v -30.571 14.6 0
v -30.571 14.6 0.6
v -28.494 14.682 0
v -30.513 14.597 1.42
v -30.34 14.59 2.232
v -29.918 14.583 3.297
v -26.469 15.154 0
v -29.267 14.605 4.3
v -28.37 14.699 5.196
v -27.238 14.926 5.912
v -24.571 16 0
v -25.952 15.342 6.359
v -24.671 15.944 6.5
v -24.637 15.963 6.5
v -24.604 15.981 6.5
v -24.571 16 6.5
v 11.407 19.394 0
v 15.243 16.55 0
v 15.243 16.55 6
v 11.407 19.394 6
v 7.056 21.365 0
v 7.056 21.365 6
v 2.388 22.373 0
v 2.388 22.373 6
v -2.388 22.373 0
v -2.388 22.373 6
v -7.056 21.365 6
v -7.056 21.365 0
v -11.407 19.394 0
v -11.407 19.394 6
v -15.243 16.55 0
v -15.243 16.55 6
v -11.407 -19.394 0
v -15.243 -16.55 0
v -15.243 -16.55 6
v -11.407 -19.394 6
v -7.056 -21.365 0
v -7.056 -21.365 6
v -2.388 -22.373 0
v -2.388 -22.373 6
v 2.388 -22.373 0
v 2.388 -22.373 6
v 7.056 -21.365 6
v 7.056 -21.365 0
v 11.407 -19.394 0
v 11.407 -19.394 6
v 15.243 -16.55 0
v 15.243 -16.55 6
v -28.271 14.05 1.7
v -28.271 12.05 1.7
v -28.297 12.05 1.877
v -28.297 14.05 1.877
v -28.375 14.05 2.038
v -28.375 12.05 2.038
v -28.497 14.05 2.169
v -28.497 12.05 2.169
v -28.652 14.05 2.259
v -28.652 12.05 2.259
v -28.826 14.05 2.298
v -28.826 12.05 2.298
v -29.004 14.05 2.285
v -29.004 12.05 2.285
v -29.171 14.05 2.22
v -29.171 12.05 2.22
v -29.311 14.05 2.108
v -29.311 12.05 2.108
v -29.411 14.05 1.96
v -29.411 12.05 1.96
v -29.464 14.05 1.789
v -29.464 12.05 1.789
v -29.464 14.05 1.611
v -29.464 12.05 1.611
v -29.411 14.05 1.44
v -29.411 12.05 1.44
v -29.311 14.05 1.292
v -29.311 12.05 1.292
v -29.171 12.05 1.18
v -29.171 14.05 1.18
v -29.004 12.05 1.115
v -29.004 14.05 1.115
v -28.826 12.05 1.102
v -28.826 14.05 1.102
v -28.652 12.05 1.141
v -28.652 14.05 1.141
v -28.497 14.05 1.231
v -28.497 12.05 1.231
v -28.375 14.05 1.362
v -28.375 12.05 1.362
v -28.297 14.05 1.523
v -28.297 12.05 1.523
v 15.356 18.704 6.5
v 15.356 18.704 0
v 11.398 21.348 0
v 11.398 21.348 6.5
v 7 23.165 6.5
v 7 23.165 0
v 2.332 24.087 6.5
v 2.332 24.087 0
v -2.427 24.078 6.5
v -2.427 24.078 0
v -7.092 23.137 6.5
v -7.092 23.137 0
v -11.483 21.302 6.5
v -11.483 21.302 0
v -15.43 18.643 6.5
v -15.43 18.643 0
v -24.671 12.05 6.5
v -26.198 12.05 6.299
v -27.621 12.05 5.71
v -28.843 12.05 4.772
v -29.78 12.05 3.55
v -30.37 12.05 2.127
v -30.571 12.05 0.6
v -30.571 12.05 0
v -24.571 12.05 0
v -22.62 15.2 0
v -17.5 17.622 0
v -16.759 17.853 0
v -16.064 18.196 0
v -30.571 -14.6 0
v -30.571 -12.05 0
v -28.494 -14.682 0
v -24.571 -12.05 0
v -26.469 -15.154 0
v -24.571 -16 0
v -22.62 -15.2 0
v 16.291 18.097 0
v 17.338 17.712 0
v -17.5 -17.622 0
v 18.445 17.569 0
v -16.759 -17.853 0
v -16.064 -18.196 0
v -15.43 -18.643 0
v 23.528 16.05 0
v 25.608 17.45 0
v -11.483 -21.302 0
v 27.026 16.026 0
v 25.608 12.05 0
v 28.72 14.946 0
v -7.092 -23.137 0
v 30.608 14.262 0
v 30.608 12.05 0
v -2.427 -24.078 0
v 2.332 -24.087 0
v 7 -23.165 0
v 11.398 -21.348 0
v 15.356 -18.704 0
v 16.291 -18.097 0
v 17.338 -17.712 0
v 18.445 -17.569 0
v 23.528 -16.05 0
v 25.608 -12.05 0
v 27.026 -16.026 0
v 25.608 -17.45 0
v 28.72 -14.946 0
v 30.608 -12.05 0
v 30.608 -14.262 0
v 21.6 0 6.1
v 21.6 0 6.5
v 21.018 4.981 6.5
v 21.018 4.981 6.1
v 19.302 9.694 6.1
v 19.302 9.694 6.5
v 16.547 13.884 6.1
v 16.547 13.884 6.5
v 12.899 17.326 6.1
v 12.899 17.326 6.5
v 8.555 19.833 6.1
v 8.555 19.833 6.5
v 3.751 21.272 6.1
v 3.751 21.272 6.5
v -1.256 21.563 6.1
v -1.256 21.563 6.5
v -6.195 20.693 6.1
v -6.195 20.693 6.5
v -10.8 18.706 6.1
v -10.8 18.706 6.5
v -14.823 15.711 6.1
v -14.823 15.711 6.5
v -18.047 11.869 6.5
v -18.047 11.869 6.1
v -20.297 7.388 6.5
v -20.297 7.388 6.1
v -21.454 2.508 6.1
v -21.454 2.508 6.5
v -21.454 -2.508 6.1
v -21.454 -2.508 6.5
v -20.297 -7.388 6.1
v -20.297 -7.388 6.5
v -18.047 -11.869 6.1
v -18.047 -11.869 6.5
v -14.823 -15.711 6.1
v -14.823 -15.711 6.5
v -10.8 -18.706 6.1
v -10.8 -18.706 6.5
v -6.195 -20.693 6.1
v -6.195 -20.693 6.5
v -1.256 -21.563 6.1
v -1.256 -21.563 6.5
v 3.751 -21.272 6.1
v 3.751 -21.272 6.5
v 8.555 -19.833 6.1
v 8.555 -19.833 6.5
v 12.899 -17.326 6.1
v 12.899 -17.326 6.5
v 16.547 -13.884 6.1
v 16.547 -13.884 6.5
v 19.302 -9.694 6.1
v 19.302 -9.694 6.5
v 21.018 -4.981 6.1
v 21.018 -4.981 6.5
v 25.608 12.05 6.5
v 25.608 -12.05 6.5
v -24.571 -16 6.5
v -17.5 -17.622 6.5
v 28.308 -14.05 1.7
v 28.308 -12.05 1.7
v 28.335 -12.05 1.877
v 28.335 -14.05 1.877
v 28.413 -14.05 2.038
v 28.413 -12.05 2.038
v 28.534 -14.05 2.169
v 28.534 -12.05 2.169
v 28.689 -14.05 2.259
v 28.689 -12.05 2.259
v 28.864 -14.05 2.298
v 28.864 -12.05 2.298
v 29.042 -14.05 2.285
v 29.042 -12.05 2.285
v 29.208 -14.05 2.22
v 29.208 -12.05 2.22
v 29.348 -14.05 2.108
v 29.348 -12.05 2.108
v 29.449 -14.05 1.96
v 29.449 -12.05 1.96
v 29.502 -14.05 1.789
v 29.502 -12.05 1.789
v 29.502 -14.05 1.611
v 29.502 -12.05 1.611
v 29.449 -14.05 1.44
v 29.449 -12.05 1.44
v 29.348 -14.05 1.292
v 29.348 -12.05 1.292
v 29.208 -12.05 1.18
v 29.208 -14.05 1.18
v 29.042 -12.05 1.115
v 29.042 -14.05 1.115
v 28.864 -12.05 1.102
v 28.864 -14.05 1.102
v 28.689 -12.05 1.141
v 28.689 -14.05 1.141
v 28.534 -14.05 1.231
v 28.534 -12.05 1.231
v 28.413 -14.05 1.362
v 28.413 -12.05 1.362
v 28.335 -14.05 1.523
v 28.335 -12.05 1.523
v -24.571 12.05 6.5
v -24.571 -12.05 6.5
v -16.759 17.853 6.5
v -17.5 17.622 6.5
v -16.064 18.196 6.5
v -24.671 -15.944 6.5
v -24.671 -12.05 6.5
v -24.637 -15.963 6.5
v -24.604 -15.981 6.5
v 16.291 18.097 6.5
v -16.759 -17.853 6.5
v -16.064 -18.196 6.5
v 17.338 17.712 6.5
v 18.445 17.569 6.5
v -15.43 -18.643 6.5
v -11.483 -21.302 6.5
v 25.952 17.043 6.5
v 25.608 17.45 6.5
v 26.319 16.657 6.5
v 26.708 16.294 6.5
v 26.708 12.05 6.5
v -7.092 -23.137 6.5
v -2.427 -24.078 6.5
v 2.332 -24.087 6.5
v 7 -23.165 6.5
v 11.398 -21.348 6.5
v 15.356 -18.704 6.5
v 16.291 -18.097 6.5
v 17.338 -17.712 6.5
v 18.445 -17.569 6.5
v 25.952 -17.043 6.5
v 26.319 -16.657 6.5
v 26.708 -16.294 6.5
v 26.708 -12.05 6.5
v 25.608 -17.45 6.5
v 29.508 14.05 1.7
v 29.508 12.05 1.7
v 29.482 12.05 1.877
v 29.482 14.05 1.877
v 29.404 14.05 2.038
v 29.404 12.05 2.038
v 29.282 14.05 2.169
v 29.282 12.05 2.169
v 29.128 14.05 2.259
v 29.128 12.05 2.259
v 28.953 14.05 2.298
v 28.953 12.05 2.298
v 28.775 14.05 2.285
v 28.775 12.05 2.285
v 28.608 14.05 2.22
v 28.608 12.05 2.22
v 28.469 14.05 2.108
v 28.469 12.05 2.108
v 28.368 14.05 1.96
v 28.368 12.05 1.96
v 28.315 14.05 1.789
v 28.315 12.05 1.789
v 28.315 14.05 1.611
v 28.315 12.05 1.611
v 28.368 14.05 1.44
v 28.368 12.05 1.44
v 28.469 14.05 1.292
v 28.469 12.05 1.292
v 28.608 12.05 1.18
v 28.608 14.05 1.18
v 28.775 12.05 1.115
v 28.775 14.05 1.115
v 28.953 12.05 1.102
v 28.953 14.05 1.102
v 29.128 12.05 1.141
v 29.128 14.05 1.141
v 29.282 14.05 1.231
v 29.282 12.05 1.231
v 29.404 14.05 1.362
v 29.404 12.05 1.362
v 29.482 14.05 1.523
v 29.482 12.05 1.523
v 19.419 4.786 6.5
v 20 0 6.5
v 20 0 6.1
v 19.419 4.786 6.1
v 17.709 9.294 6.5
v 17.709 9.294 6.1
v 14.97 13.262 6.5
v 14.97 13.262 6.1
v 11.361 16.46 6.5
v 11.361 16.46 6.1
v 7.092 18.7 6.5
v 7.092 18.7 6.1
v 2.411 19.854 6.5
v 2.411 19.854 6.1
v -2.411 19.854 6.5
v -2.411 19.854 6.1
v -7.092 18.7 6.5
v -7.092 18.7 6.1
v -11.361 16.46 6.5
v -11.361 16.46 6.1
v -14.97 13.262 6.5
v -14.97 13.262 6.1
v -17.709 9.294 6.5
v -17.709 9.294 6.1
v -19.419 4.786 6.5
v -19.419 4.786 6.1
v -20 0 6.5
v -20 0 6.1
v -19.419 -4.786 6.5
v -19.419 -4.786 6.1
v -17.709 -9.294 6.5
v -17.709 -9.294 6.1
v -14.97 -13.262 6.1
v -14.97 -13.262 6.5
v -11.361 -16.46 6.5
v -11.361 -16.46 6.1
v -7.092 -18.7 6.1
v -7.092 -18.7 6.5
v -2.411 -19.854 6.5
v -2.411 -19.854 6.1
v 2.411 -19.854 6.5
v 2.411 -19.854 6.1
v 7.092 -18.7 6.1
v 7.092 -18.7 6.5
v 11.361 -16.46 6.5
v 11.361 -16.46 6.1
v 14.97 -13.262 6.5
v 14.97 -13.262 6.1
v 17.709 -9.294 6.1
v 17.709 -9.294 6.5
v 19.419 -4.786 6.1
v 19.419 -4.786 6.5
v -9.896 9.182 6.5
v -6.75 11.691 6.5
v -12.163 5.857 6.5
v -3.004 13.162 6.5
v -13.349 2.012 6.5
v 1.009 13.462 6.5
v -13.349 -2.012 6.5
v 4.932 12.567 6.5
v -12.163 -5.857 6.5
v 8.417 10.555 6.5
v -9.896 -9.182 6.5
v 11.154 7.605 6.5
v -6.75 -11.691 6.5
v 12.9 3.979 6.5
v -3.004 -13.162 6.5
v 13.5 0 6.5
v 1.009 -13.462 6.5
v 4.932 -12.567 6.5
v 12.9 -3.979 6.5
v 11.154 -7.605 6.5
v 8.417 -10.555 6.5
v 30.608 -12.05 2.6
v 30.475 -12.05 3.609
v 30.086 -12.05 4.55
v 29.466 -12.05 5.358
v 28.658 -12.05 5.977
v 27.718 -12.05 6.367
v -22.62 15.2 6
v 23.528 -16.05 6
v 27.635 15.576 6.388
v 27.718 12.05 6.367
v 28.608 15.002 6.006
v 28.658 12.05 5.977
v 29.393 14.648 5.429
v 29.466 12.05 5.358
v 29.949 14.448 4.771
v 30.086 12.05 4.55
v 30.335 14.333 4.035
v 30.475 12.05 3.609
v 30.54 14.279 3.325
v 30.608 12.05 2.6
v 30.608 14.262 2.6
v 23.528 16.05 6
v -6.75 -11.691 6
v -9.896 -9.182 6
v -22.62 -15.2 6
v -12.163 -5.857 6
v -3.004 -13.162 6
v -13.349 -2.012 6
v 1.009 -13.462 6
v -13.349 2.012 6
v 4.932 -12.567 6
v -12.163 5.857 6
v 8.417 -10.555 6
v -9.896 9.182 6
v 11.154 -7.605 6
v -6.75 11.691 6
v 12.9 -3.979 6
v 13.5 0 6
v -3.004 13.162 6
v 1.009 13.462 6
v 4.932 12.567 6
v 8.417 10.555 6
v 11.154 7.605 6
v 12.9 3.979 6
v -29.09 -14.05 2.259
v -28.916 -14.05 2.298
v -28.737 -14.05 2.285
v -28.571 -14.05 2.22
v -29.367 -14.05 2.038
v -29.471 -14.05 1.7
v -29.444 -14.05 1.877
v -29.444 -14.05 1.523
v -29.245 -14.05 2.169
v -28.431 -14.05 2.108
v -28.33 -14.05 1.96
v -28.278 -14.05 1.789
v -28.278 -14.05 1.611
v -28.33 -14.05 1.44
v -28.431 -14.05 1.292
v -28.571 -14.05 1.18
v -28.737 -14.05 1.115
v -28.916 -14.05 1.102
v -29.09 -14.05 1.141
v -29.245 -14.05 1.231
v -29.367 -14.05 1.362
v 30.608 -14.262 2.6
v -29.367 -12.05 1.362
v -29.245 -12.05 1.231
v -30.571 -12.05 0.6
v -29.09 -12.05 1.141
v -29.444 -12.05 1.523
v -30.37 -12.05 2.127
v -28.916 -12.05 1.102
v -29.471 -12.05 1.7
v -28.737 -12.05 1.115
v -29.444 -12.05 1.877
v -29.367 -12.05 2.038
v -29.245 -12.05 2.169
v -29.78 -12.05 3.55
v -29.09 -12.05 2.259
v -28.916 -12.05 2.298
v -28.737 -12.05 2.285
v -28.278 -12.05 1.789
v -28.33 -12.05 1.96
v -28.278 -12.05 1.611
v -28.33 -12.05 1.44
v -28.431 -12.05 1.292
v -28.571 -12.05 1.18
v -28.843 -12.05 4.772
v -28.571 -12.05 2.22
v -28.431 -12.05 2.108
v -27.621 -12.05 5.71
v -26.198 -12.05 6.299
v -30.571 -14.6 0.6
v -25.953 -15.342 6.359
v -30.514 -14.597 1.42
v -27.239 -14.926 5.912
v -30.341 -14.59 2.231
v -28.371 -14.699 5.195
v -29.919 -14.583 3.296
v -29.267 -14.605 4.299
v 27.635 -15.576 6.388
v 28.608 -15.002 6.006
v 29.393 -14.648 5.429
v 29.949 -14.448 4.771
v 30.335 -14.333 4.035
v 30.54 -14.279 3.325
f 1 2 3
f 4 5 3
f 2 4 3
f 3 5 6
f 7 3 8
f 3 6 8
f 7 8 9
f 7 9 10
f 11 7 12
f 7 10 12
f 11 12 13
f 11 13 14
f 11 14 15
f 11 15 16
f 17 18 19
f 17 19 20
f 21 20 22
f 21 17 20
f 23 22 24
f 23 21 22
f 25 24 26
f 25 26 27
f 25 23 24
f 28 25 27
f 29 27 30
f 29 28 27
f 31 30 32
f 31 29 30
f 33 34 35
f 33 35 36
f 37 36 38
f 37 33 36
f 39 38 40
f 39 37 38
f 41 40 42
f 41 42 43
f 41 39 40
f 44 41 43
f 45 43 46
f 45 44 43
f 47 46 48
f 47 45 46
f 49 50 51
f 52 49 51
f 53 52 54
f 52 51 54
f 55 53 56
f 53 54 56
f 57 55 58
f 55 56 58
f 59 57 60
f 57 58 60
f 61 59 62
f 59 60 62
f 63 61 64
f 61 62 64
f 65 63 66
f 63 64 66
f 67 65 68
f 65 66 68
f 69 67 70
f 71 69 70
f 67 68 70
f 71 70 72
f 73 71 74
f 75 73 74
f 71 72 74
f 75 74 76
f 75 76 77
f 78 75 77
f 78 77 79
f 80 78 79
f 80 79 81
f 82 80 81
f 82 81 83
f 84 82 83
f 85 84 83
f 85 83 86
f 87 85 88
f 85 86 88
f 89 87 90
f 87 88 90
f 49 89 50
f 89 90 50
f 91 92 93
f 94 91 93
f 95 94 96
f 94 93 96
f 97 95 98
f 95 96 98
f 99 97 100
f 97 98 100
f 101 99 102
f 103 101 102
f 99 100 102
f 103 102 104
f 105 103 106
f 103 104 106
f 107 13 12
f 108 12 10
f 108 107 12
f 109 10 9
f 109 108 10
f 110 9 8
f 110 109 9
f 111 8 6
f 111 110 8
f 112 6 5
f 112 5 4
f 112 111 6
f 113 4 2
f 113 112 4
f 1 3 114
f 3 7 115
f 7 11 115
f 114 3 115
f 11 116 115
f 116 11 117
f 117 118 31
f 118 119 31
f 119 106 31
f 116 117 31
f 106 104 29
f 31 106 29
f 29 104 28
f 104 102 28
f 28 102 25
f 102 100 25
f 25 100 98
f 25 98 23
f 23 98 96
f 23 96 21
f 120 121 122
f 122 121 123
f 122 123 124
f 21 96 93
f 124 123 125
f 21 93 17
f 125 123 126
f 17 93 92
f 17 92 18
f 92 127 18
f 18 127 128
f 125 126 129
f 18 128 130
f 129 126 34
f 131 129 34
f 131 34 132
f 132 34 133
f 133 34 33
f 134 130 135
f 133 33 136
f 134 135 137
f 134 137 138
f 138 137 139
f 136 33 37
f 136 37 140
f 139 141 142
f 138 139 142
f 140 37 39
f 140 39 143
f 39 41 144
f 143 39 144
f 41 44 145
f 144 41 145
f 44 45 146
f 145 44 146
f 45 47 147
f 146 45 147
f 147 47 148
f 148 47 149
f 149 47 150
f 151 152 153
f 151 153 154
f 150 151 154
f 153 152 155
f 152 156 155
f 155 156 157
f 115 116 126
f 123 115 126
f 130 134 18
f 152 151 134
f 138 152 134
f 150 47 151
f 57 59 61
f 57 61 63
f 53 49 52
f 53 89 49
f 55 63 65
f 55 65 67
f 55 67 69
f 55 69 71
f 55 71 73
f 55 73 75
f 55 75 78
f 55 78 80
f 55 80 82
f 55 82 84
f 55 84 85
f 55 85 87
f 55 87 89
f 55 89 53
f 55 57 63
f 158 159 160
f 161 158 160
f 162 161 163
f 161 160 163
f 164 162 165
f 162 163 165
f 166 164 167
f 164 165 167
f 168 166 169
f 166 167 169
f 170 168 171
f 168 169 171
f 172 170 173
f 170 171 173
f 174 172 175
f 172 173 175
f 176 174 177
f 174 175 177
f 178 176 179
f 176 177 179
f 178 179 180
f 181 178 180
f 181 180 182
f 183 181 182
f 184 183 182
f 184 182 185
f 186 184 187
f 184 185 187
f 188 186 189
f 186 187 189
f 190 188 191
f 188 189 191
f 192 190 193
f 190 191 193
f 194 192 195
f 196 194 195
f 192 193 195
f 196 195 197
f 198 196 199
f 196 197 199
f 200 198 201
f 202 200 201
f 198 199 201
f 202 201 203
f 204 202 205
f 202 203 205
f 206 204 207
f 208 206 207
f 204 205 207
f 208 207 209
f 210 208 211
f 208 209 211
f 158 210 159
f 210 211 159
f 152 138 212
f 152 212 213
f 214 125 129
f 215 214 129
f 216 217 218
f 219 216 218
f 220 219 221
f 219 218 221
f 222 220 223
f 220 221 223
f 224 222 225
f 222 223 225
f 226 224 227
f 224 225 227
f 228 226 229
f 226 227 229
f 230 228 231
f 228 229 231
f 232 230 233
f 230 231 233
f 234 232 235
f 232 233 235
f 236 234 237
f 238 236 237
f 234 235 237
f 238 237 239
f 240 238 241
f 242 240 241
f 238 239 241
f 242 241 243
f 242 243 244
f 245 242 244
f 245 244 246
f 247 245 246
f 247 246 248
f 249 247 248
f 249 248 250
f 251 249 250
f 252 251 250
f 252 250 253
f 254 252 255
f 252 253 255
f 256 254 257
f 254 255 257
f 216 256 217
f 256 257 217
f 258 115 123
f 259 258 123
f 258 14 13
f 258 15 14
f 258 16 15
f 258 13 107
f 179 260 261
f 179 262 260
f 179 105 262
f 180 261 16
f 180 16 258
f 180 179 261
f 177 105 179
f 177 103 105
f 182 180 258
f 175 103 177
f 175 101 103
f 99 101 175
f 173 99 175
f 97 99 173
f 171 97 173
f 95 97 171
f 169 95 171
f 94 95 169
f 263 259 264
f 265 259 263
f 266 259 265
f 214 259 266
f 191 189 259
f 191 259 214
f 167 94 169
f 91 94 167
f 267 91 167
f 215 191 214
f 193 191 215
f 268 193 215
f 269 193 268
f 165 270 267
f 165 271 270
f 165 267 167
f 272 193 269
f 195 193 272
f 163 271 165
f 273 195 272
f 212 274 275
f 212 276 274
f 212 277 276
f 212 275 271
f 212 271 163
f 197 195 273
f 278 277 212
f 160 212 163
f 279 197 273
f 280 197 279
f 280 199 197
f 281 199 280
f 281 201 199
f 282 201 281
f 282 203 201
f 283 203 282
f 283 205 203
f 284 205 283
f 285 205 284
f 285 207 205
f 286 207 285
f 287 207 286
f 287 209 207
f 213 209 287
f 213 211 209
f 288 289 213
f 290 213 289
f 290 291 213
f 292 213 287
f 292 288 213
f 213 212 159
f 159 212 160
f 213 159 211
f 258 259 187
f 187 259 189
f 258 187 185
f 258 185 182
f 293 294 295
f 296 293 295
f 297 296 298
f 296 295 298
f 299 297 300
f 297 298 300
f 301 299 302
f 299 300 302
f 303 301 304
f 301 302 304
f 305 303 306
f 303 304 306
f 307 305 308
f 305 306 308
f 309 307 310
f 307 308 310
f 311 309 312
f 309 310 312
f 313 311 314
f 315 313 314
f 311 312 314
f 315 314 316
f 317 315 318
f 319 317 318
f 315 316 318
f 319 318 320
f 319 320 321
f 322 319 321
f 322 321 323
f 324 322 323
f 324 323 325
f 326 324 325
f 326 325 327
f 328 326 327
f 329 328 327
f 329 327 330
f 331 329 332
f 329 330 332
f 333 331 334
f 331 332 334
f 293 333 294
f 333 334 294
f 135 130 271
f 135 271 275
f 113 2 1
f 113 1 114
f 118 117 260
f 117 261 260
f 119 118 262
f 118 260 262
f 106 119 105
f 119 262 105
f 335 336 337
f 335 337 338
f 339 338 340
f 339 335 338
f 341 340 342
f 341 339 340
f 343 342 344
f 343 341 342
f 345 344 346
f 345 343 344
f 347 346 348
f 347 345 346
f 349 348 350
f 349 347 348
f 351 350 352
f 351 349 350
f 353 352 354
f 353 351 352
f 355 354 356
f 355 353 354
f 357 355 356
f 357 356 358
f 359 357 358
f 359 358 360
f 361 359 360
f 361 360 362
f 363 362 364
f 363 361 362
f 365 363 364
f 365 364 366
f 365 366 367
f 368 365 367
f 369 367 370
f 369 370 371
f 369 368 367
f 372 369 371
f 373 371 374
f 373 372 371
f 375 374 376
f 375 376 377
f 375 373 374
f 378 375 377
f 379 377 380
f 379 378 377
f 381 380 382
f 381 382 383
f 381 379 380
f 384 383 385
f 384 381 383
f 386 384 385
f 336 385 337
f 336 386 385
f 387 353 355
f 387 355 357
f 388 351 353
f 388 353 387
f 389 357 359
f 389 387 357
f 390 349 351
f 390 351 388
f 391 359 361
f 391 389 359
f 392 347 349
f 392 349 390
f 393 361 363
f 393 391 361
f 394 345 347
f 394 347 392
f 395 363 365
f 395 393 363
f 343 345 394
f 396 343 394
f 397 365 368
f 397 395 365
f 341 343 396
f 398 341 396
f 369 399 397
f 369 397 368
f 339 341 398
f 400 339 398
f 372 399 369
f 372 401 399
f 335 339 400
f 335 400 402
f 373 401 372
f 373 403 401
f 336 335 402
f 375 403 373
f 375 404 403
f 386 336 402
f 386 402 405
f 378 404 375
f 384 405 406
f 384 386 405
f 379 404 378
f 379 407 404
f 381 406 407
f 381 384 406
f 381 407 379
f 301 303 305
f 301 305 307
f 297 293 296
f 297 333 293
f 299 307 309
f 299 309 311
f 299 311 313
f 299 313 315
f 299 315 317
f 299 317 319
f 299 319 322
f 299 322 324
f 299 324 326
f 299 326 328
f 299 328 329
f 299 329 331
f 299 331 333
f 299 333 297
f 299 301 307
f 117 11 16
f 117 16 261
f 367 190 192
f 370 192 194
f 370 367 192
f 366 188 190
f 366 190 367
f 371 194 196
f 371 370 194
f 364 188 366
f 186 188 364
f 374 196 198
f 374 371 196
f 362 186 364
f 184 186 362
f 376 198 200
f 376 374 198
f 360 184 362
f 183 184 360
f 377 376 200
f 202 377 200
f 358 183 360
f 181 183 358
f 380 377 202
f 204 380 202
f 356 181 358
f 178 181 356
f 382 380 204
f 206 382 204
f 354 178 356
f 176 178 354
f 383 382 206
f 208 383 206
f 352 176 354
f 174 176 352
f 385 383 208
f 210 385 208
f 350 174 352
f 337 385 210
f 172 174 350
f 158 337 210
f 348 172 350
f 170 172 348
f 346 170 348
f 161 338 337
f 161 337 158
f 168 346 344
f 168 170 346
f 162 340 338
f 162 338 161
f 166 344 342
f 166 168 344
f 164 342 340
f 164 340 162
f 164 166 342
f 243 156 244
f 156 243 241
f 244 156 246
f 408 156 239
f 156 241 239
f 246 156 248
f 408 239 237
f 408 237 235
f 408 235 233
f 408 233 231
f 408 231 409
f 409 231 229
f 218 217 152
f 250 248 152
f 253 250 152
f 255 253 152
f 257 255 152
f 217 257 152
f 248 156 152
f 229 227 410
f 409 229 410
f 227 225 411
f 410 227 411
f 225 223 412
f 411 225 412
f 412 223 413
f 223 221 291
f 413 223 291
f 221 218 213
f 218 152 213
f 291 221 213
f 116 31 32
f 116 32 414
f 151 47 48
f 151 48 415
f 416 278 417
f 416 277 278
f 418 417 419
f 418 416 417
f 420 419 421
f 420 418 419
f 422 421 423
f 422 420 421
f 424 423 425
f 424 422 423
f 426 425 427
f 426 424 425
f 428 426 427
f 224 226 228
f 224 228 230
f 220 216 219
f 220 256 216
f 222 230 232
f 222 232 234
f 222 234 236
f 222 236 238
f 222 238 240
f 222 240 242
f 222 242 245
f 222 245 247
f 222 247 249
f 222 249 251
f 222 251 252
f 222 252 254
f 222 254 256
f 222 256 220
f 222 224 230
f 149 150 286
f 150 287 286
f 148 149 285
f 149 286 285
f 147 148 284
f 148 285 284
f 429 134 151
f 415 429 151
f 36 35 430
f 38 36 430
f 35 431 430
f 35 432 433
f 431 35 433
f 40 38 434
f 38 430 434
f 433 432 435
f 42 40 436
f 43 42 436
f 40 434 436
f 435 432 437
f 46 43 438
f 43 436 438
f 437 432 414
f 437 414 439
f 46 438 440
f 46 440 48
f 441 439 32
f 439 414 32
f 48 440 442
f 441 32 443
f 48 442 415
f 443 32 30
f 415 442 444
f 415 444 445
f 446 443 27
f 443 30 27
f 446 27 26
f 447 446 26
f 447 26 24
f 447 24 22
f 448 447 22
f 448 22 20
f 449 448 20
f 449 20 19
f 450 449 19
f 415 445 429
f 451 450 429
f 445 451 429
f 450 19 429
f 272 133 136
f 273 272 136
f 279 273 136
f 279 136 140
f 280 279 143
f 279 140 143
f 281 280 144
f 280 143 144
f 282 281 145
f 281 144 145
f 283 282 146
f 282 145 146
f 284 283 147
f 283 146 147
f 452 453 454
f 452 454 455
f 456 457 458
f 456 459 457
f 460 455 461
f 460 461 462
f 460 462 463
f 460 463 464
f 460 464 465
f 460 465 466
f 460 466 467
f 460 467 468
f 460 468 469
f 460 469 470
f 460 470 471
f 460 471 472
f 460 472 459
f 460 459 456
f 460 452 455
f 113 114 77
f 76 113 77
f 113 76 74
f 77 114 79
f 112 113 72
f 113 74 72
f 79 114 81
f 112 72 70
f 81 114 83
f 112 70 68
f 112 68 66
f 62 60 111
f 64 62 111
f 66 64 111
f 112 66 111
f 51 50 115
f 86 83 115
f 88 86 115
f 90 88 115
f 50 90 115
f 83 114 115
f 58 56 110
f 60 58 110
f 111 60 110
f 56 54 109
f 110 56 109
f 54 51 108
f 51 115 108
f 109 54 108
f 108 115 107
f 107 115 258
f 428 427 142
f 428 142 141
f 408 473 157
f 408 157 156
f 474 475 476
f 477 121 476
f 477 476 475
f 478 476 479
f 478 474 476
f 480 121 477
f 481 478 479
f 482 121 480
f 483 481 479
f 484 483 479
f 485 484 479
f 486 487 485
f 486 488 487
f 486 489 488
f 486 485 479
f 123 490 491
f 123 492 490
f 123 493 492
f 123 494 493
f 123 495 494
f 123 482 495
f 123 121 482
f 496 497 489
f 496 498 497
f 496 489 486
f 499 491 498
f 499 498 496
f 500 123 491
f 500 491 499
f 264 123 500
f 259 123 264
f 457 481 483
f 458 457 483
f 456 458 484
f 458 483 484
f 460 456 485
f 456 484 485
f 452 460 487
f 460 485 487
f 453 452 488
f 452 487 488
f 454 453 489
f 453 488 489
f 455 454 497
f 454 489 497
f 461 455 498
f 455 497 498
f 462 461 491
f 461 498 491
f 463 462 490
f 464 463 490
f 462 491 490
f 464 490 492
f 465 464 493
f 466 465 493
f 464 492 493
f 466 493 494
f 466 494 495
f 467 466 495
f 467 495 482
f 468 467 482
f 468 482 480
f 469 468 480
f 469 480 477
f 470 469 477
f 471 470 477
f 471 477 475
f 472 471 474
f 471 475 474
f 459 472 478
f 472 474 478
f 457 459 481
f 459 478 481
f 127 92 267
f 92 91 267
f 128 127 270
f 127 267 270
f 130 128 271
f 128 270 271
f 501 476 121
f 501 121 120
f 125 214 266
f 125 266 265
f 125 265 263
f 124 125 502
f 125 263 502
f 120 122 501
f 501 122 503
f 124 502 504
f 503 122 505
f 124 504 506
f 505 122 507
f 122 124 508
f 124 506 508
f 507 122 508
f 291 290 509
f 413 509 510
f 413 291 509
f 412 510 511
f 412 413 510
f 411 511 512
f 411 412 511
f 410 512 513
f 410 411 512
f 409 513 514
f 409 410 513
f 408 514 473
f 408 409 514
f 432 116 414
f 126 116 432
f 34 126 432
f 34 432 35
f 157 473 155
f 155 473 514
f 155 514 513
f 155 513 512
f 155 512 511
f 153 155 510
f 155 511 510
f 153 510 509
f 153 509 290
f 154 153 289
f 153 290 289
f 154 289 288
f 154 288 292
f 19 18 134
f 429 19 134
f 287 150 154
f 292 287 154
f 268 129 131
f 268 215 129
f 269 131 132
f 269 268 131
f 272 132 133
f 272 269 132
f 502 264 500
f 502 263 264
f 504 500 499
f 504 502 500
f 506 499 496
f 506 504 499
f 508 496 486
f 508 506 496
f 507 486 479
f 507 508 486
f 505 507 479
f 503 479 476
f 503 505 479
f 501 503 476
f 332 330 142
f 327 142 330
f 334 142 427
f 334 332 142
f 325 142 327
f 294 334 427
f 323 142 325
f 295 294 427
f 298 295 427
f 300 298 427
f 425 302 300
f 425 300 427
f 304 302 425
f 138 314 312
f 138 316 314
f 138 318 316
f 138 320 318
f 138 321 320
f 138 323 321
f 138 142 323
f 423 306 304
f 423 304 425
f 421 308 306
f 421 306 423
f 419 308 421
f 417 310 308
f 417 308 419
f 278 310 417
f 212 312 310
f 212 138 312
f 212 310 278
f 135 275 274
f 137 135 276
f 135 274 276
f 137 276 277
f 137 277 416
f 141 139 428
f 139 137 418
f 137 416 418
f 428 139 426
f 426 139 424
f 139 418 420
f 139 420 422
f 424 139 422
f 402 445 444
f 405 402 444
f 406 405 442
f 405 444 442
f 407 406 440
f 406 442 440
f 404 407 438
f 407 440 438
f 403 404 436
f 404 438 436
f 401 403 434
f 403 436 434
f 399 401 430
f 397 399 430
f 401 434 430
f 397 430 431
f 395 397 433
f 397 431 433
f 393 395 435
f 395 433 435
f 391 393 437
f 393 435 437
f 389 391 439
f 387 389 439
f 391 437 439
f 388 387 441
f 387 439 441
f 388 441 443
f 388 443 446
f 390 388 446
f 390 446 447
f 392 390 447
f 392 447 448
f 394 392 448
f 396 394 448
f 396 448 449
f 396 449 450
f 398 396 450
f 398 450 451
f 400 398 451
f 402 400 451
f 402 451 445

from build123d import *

# Parameters (mm, degrees)
PAD_DEPTH       = 6.5
POCKET_DEPTH    = 6
SKETCH002_R     = 13.5
POCKET001_DEPTH = 1
SKETCH003_W     = 5.4
SKETCH003_H     = 6.5
PAD001_DEPTH    = 5
POCKET002_DEPTH = 10
SKETCH008_R     = 0.6
POCKET003_DEPTH = 2
SKETCH009_R     = 0.6
POCKET004_DEPTH = 2
FILLET_R        = 3.9
FILLET001_R     = 3.9
FILLET002_R     = 5
FILLET003_R     = 5
FILLET004_R     = 5
FILLET005_R     = 5
SKETCH010_W     = 3.95
SKETCH010_H     = 6.5
PAD002_DEPTH    = 6
POCKET005_DEPTH = 10
SKETCH012_R     = 0.6
POCKET006_DEPTH = 2
SKETCH013_R     = 0.6
POCKET007_DEPTH = 2
FILLET006_R     = 5.9
FILLET007_R     = 5.9
SKETCH014_R     = 21.6
SKETCH014_R_2   = 20
POCKET008_DEPTH = 0.4


with BuildPart() as part:
    # Sketch → Pad (new body)
    with BuildSketch(Plane.XY):
        with BuildLine():
            Line((-24.57081, 16), (-24.57081, -16))
            Line((-24.57081, -16), (-16.285883, -17.9))
            ThreePointArc((-16.285883, -17.9), (0.22069, -24.198994), (16.609636, -17.6))
            Line((16.609636, -17.6), (25.608386, -17.45))
            Line((25.608386, 17.45), (25.608386, -17.45))
            Line((16.609636, 17.6), (25.608386, 17.45))
            ThreePointArc((16.609636, 17.6), (0.22069, 24.198994), (-16.285883, 17.9))
            Line((-24.57081, 16), (-16.285883, 17.9))
        make_face()
    extrude(amount=PAD_DEPTH)

    # Sketch001 → Pocket (cut)
    with BuildSketch(Plane.XY):
        with BuildLine():
            Line((-15.242949, 16.55), (-22.620449, 15.2))
            Line((-22.620449, 15.2), (-22.620449, -15.2))
            Line((-22.620449, -15.2), (-15.242949, -16.55))
            ThreePointArc((-15.242949, -16.55), (0, -22.5), (15.242949, -16.55))
            Line((15.242949, -16.55), (23.527875, -16.05))
            Line((23.527875, 16.05), (23.527875, -16.05))
            Line((15.242949, 16.55), (23.527875, 16.05))
            ThreePointArc((15.242949, 16.55), (0, 22.5), (-15.242949, 16.55))
        make_face()
    extrude(amount=POCKET_DEPTH, mode=Mode.SUBTRACT)

    # Sketch002 (on Face19 of Pocket) → Pocket001 (cut)
    with BuildSketch(Plane(origin=(0, 0, 6), x_dir=(1, 0, 0), z_dir=(0, 0, -1))):
        Circle(SKETCH002_R)
    extrude(amount=-POCKET001_DEPTH, mode=Mode.SUBTRACT)

    # Sketch003 (on Face6 of Pocket001) → Pad001 (join)
    with BuildSketch(Plane.YZ.offset(25.608386)):
        with Locations((-14.75, 3.25)):
            Rectangle(SKETCH003_W, SKETCH003_H)
        with Locations((14.75, 3.25)):
            Rectangle(SKETCH003_W, SKETCH003_H)
    extrude(amount=PAD001_DEPTH)

    # Sketch006 → Pocket002 (cut)
    with BuildSketch(Plane.XY.offset(10)):
        with BuildLine():
            ThreePointArc((25.608386, 17.45), (27.842824, 15.439634), (30.608386, 14.262368))
            Line((30.608386, 17.45), (30.608386, 14.262368))
            Line((30.608386, 17.45), (25.608386, 17.45))
        make_face()
        with BuildLine():
            ThreePointArc((30.608386, -14.262368), (27.842824, -15.439634), (25.608386, -17.45))
            Line((30.608386, -17.45), (25.608386, -17.45))
            Line((30.608386, -14.262368), (30.608386, -17.45))
        make_face()
    extrude(amount=-POCKET002_DEPTH, mode=Mode.SUBTRACT)

    # Sketch008 (on Face27 of Pocket002) → Pocket003 (cut)
    with BuildSketch(Plane(origin=(0, -12.05, 0), x_dir=(-1, 0, 0), z_dir=(0, 1, 0))):
        with Locations((-28.908386, 1.7)):
            Circle(SKETCH008_R)
    extrude(amount=-POCKET003_DEPTH, mode=Mode.SUBTRACT)

    # Sketch009 (on Face26 of Pocket003) → Pocket004 (cut)
    with BuildSketch(Plane.XZ.offset(-12.05)):
        with Locations((28.908386, 1.7)):
            Circle(SKETCH009_R)
    extrude(amount=-POCKET004_DEPTH, mode=Mode.SUBTRACT)

    # Fillet
    fillet_edges = [part.edges().sort_by_distance(p)[0] for p in [
        (30.608386, -13.156184, 6.5),
    ]]
    fillet(fillet_edges, radius=FILLET_R)

    # Fillet001
    fillet001_edges = [part.edges().sort_by_distance(p)[0] for p in [
        (30.608386, 13.156184, 6.5),
    ]]
    fillet(fillet001_edges, radius=FILLET001_R)

    # Fillet002
    fillet002_edges = [part.edges().sort_by_distance(p)[0] for p in [
        (16.609636, -17.6, 3.25),
    ]]
    fillet(fillet002_edges, radius=FILLET002_R)

    # Fillet003
    fillet003_edges = [part.edges().sort_by_distance(p)[0] for p in [
        (16.609636, 17.6, 3.25),
    ]]
    fillet(fillet003_edges, radius=FILLET003_R)

    # Fillet004
    fillet004_edges = [part.edges().sort_by_distance(p)[0] for p in [
        (-16.285883, -17.9, 3.25),
    ]]
    fillet(fillet004_edges, radius=FILLET004_R)

    # Fillet005
    fillet005_edges = [part.edges().sort_by_distance(p)[0] for p in [
        (-16.285883, 17.9, 3.25),
    ]]
    fillet(fillet005_edges, radius=FILLET005_R)

    # Sketch010 (on Face4 of Fillet005) → Pad002 (join)
    with BuildSketch(Plane(origin=(-24.57081, 0, 0), x_dir=(0, -1, 0), z_dir=(-1, 0, 0))):
        with Locations((-14.025, 3.25)):
            Rectangle(SKETCH010_W, SKETCH010_H)
        with Locations((14.025, 3.25)):
            Rectangle(SKETCH010_W, SKETCH010_H)
    extrude(amount=PAD002_DEPTH)

    # Sketch011 (on Face6 of Pad002) → Pocket005 (cut)
    with BuildSketch(Plane.XY.offset(6.5)):
        with BuildLine():
            ThreePointArc((-30.57081, 14.6), (-27.470381, 14.869592), (-24.57081, 16))
            Line((-24.57081, 16), (-30.57081, 16))
            Line((-30.57081, 16), (-30.57081, 14.6))
        make_face()
        with BuildLine():
            ThreePointArc((-24.57081, -16), (-27.470381, -14.869592), (-30.57081, -14.6))
            Line((-30.57081, -14.6), (-30.57081, -16))
            Line((-30.57081, -16), (-24.57081, -16))
        make_face()
    extrude(amount=-POCKET005_DEPTH, mode=Mode.SUBTRACT)

    # Sketch012 (on Face23 of Pocket005) → Pocket006 (cut)
    with BuildSketch(Plane(origin=(0, -12.05, 0), x_dir=(-1, 0, 0), z_dir=(0, 1, 0))):
        with Locations((28.87081, 1.7)):
            Circle(SKETCH012_R)
    extrude(amount=-POCKET006_DEPTH, mode=Mode.SUBTRACT)

    # Sketch013 (on Face21 of Pocket006) → Pocket007 (cut)
    with BuildSketch(Plane.XZ.offset(-12.05)):
        with Locations((-28.87081, 1.7)):
            Circle(SKETCH013_R)
    extrude(amount=-POCKET007_DEPTH, mode=Mode.SUBTRACT)

    # Fillet006
    fillet006_edges = [part.edges().sort_by_distance(p)[0] for p in [
        (-30.57081, 13.325, 6.5),
    ]]
    fillet(fillet006_edges, radius=FILLET006_R)

    # Fillet007
    fillet007_edges = [part.edges().sort_by_distance(p)[0] for p in [
        (-30.57081, -13.325, 6.5),
    ]]
    fillet(fillet007_edges, radius=FILLET007_R)

    # Sketch014 (on Face4 of Fillet007) → Pocket008 (cut)
    with BuildSketch(Plane.XY.offset(6.5)):
        Circle(SKETCH014_R)
        Circle(SKETCH014_R_2, mode=Mode.SUBTRACT)
    extrude(amount=-POCKET008_DEPTH, mode=Mode.SUBTRACT)


solid = part.part
